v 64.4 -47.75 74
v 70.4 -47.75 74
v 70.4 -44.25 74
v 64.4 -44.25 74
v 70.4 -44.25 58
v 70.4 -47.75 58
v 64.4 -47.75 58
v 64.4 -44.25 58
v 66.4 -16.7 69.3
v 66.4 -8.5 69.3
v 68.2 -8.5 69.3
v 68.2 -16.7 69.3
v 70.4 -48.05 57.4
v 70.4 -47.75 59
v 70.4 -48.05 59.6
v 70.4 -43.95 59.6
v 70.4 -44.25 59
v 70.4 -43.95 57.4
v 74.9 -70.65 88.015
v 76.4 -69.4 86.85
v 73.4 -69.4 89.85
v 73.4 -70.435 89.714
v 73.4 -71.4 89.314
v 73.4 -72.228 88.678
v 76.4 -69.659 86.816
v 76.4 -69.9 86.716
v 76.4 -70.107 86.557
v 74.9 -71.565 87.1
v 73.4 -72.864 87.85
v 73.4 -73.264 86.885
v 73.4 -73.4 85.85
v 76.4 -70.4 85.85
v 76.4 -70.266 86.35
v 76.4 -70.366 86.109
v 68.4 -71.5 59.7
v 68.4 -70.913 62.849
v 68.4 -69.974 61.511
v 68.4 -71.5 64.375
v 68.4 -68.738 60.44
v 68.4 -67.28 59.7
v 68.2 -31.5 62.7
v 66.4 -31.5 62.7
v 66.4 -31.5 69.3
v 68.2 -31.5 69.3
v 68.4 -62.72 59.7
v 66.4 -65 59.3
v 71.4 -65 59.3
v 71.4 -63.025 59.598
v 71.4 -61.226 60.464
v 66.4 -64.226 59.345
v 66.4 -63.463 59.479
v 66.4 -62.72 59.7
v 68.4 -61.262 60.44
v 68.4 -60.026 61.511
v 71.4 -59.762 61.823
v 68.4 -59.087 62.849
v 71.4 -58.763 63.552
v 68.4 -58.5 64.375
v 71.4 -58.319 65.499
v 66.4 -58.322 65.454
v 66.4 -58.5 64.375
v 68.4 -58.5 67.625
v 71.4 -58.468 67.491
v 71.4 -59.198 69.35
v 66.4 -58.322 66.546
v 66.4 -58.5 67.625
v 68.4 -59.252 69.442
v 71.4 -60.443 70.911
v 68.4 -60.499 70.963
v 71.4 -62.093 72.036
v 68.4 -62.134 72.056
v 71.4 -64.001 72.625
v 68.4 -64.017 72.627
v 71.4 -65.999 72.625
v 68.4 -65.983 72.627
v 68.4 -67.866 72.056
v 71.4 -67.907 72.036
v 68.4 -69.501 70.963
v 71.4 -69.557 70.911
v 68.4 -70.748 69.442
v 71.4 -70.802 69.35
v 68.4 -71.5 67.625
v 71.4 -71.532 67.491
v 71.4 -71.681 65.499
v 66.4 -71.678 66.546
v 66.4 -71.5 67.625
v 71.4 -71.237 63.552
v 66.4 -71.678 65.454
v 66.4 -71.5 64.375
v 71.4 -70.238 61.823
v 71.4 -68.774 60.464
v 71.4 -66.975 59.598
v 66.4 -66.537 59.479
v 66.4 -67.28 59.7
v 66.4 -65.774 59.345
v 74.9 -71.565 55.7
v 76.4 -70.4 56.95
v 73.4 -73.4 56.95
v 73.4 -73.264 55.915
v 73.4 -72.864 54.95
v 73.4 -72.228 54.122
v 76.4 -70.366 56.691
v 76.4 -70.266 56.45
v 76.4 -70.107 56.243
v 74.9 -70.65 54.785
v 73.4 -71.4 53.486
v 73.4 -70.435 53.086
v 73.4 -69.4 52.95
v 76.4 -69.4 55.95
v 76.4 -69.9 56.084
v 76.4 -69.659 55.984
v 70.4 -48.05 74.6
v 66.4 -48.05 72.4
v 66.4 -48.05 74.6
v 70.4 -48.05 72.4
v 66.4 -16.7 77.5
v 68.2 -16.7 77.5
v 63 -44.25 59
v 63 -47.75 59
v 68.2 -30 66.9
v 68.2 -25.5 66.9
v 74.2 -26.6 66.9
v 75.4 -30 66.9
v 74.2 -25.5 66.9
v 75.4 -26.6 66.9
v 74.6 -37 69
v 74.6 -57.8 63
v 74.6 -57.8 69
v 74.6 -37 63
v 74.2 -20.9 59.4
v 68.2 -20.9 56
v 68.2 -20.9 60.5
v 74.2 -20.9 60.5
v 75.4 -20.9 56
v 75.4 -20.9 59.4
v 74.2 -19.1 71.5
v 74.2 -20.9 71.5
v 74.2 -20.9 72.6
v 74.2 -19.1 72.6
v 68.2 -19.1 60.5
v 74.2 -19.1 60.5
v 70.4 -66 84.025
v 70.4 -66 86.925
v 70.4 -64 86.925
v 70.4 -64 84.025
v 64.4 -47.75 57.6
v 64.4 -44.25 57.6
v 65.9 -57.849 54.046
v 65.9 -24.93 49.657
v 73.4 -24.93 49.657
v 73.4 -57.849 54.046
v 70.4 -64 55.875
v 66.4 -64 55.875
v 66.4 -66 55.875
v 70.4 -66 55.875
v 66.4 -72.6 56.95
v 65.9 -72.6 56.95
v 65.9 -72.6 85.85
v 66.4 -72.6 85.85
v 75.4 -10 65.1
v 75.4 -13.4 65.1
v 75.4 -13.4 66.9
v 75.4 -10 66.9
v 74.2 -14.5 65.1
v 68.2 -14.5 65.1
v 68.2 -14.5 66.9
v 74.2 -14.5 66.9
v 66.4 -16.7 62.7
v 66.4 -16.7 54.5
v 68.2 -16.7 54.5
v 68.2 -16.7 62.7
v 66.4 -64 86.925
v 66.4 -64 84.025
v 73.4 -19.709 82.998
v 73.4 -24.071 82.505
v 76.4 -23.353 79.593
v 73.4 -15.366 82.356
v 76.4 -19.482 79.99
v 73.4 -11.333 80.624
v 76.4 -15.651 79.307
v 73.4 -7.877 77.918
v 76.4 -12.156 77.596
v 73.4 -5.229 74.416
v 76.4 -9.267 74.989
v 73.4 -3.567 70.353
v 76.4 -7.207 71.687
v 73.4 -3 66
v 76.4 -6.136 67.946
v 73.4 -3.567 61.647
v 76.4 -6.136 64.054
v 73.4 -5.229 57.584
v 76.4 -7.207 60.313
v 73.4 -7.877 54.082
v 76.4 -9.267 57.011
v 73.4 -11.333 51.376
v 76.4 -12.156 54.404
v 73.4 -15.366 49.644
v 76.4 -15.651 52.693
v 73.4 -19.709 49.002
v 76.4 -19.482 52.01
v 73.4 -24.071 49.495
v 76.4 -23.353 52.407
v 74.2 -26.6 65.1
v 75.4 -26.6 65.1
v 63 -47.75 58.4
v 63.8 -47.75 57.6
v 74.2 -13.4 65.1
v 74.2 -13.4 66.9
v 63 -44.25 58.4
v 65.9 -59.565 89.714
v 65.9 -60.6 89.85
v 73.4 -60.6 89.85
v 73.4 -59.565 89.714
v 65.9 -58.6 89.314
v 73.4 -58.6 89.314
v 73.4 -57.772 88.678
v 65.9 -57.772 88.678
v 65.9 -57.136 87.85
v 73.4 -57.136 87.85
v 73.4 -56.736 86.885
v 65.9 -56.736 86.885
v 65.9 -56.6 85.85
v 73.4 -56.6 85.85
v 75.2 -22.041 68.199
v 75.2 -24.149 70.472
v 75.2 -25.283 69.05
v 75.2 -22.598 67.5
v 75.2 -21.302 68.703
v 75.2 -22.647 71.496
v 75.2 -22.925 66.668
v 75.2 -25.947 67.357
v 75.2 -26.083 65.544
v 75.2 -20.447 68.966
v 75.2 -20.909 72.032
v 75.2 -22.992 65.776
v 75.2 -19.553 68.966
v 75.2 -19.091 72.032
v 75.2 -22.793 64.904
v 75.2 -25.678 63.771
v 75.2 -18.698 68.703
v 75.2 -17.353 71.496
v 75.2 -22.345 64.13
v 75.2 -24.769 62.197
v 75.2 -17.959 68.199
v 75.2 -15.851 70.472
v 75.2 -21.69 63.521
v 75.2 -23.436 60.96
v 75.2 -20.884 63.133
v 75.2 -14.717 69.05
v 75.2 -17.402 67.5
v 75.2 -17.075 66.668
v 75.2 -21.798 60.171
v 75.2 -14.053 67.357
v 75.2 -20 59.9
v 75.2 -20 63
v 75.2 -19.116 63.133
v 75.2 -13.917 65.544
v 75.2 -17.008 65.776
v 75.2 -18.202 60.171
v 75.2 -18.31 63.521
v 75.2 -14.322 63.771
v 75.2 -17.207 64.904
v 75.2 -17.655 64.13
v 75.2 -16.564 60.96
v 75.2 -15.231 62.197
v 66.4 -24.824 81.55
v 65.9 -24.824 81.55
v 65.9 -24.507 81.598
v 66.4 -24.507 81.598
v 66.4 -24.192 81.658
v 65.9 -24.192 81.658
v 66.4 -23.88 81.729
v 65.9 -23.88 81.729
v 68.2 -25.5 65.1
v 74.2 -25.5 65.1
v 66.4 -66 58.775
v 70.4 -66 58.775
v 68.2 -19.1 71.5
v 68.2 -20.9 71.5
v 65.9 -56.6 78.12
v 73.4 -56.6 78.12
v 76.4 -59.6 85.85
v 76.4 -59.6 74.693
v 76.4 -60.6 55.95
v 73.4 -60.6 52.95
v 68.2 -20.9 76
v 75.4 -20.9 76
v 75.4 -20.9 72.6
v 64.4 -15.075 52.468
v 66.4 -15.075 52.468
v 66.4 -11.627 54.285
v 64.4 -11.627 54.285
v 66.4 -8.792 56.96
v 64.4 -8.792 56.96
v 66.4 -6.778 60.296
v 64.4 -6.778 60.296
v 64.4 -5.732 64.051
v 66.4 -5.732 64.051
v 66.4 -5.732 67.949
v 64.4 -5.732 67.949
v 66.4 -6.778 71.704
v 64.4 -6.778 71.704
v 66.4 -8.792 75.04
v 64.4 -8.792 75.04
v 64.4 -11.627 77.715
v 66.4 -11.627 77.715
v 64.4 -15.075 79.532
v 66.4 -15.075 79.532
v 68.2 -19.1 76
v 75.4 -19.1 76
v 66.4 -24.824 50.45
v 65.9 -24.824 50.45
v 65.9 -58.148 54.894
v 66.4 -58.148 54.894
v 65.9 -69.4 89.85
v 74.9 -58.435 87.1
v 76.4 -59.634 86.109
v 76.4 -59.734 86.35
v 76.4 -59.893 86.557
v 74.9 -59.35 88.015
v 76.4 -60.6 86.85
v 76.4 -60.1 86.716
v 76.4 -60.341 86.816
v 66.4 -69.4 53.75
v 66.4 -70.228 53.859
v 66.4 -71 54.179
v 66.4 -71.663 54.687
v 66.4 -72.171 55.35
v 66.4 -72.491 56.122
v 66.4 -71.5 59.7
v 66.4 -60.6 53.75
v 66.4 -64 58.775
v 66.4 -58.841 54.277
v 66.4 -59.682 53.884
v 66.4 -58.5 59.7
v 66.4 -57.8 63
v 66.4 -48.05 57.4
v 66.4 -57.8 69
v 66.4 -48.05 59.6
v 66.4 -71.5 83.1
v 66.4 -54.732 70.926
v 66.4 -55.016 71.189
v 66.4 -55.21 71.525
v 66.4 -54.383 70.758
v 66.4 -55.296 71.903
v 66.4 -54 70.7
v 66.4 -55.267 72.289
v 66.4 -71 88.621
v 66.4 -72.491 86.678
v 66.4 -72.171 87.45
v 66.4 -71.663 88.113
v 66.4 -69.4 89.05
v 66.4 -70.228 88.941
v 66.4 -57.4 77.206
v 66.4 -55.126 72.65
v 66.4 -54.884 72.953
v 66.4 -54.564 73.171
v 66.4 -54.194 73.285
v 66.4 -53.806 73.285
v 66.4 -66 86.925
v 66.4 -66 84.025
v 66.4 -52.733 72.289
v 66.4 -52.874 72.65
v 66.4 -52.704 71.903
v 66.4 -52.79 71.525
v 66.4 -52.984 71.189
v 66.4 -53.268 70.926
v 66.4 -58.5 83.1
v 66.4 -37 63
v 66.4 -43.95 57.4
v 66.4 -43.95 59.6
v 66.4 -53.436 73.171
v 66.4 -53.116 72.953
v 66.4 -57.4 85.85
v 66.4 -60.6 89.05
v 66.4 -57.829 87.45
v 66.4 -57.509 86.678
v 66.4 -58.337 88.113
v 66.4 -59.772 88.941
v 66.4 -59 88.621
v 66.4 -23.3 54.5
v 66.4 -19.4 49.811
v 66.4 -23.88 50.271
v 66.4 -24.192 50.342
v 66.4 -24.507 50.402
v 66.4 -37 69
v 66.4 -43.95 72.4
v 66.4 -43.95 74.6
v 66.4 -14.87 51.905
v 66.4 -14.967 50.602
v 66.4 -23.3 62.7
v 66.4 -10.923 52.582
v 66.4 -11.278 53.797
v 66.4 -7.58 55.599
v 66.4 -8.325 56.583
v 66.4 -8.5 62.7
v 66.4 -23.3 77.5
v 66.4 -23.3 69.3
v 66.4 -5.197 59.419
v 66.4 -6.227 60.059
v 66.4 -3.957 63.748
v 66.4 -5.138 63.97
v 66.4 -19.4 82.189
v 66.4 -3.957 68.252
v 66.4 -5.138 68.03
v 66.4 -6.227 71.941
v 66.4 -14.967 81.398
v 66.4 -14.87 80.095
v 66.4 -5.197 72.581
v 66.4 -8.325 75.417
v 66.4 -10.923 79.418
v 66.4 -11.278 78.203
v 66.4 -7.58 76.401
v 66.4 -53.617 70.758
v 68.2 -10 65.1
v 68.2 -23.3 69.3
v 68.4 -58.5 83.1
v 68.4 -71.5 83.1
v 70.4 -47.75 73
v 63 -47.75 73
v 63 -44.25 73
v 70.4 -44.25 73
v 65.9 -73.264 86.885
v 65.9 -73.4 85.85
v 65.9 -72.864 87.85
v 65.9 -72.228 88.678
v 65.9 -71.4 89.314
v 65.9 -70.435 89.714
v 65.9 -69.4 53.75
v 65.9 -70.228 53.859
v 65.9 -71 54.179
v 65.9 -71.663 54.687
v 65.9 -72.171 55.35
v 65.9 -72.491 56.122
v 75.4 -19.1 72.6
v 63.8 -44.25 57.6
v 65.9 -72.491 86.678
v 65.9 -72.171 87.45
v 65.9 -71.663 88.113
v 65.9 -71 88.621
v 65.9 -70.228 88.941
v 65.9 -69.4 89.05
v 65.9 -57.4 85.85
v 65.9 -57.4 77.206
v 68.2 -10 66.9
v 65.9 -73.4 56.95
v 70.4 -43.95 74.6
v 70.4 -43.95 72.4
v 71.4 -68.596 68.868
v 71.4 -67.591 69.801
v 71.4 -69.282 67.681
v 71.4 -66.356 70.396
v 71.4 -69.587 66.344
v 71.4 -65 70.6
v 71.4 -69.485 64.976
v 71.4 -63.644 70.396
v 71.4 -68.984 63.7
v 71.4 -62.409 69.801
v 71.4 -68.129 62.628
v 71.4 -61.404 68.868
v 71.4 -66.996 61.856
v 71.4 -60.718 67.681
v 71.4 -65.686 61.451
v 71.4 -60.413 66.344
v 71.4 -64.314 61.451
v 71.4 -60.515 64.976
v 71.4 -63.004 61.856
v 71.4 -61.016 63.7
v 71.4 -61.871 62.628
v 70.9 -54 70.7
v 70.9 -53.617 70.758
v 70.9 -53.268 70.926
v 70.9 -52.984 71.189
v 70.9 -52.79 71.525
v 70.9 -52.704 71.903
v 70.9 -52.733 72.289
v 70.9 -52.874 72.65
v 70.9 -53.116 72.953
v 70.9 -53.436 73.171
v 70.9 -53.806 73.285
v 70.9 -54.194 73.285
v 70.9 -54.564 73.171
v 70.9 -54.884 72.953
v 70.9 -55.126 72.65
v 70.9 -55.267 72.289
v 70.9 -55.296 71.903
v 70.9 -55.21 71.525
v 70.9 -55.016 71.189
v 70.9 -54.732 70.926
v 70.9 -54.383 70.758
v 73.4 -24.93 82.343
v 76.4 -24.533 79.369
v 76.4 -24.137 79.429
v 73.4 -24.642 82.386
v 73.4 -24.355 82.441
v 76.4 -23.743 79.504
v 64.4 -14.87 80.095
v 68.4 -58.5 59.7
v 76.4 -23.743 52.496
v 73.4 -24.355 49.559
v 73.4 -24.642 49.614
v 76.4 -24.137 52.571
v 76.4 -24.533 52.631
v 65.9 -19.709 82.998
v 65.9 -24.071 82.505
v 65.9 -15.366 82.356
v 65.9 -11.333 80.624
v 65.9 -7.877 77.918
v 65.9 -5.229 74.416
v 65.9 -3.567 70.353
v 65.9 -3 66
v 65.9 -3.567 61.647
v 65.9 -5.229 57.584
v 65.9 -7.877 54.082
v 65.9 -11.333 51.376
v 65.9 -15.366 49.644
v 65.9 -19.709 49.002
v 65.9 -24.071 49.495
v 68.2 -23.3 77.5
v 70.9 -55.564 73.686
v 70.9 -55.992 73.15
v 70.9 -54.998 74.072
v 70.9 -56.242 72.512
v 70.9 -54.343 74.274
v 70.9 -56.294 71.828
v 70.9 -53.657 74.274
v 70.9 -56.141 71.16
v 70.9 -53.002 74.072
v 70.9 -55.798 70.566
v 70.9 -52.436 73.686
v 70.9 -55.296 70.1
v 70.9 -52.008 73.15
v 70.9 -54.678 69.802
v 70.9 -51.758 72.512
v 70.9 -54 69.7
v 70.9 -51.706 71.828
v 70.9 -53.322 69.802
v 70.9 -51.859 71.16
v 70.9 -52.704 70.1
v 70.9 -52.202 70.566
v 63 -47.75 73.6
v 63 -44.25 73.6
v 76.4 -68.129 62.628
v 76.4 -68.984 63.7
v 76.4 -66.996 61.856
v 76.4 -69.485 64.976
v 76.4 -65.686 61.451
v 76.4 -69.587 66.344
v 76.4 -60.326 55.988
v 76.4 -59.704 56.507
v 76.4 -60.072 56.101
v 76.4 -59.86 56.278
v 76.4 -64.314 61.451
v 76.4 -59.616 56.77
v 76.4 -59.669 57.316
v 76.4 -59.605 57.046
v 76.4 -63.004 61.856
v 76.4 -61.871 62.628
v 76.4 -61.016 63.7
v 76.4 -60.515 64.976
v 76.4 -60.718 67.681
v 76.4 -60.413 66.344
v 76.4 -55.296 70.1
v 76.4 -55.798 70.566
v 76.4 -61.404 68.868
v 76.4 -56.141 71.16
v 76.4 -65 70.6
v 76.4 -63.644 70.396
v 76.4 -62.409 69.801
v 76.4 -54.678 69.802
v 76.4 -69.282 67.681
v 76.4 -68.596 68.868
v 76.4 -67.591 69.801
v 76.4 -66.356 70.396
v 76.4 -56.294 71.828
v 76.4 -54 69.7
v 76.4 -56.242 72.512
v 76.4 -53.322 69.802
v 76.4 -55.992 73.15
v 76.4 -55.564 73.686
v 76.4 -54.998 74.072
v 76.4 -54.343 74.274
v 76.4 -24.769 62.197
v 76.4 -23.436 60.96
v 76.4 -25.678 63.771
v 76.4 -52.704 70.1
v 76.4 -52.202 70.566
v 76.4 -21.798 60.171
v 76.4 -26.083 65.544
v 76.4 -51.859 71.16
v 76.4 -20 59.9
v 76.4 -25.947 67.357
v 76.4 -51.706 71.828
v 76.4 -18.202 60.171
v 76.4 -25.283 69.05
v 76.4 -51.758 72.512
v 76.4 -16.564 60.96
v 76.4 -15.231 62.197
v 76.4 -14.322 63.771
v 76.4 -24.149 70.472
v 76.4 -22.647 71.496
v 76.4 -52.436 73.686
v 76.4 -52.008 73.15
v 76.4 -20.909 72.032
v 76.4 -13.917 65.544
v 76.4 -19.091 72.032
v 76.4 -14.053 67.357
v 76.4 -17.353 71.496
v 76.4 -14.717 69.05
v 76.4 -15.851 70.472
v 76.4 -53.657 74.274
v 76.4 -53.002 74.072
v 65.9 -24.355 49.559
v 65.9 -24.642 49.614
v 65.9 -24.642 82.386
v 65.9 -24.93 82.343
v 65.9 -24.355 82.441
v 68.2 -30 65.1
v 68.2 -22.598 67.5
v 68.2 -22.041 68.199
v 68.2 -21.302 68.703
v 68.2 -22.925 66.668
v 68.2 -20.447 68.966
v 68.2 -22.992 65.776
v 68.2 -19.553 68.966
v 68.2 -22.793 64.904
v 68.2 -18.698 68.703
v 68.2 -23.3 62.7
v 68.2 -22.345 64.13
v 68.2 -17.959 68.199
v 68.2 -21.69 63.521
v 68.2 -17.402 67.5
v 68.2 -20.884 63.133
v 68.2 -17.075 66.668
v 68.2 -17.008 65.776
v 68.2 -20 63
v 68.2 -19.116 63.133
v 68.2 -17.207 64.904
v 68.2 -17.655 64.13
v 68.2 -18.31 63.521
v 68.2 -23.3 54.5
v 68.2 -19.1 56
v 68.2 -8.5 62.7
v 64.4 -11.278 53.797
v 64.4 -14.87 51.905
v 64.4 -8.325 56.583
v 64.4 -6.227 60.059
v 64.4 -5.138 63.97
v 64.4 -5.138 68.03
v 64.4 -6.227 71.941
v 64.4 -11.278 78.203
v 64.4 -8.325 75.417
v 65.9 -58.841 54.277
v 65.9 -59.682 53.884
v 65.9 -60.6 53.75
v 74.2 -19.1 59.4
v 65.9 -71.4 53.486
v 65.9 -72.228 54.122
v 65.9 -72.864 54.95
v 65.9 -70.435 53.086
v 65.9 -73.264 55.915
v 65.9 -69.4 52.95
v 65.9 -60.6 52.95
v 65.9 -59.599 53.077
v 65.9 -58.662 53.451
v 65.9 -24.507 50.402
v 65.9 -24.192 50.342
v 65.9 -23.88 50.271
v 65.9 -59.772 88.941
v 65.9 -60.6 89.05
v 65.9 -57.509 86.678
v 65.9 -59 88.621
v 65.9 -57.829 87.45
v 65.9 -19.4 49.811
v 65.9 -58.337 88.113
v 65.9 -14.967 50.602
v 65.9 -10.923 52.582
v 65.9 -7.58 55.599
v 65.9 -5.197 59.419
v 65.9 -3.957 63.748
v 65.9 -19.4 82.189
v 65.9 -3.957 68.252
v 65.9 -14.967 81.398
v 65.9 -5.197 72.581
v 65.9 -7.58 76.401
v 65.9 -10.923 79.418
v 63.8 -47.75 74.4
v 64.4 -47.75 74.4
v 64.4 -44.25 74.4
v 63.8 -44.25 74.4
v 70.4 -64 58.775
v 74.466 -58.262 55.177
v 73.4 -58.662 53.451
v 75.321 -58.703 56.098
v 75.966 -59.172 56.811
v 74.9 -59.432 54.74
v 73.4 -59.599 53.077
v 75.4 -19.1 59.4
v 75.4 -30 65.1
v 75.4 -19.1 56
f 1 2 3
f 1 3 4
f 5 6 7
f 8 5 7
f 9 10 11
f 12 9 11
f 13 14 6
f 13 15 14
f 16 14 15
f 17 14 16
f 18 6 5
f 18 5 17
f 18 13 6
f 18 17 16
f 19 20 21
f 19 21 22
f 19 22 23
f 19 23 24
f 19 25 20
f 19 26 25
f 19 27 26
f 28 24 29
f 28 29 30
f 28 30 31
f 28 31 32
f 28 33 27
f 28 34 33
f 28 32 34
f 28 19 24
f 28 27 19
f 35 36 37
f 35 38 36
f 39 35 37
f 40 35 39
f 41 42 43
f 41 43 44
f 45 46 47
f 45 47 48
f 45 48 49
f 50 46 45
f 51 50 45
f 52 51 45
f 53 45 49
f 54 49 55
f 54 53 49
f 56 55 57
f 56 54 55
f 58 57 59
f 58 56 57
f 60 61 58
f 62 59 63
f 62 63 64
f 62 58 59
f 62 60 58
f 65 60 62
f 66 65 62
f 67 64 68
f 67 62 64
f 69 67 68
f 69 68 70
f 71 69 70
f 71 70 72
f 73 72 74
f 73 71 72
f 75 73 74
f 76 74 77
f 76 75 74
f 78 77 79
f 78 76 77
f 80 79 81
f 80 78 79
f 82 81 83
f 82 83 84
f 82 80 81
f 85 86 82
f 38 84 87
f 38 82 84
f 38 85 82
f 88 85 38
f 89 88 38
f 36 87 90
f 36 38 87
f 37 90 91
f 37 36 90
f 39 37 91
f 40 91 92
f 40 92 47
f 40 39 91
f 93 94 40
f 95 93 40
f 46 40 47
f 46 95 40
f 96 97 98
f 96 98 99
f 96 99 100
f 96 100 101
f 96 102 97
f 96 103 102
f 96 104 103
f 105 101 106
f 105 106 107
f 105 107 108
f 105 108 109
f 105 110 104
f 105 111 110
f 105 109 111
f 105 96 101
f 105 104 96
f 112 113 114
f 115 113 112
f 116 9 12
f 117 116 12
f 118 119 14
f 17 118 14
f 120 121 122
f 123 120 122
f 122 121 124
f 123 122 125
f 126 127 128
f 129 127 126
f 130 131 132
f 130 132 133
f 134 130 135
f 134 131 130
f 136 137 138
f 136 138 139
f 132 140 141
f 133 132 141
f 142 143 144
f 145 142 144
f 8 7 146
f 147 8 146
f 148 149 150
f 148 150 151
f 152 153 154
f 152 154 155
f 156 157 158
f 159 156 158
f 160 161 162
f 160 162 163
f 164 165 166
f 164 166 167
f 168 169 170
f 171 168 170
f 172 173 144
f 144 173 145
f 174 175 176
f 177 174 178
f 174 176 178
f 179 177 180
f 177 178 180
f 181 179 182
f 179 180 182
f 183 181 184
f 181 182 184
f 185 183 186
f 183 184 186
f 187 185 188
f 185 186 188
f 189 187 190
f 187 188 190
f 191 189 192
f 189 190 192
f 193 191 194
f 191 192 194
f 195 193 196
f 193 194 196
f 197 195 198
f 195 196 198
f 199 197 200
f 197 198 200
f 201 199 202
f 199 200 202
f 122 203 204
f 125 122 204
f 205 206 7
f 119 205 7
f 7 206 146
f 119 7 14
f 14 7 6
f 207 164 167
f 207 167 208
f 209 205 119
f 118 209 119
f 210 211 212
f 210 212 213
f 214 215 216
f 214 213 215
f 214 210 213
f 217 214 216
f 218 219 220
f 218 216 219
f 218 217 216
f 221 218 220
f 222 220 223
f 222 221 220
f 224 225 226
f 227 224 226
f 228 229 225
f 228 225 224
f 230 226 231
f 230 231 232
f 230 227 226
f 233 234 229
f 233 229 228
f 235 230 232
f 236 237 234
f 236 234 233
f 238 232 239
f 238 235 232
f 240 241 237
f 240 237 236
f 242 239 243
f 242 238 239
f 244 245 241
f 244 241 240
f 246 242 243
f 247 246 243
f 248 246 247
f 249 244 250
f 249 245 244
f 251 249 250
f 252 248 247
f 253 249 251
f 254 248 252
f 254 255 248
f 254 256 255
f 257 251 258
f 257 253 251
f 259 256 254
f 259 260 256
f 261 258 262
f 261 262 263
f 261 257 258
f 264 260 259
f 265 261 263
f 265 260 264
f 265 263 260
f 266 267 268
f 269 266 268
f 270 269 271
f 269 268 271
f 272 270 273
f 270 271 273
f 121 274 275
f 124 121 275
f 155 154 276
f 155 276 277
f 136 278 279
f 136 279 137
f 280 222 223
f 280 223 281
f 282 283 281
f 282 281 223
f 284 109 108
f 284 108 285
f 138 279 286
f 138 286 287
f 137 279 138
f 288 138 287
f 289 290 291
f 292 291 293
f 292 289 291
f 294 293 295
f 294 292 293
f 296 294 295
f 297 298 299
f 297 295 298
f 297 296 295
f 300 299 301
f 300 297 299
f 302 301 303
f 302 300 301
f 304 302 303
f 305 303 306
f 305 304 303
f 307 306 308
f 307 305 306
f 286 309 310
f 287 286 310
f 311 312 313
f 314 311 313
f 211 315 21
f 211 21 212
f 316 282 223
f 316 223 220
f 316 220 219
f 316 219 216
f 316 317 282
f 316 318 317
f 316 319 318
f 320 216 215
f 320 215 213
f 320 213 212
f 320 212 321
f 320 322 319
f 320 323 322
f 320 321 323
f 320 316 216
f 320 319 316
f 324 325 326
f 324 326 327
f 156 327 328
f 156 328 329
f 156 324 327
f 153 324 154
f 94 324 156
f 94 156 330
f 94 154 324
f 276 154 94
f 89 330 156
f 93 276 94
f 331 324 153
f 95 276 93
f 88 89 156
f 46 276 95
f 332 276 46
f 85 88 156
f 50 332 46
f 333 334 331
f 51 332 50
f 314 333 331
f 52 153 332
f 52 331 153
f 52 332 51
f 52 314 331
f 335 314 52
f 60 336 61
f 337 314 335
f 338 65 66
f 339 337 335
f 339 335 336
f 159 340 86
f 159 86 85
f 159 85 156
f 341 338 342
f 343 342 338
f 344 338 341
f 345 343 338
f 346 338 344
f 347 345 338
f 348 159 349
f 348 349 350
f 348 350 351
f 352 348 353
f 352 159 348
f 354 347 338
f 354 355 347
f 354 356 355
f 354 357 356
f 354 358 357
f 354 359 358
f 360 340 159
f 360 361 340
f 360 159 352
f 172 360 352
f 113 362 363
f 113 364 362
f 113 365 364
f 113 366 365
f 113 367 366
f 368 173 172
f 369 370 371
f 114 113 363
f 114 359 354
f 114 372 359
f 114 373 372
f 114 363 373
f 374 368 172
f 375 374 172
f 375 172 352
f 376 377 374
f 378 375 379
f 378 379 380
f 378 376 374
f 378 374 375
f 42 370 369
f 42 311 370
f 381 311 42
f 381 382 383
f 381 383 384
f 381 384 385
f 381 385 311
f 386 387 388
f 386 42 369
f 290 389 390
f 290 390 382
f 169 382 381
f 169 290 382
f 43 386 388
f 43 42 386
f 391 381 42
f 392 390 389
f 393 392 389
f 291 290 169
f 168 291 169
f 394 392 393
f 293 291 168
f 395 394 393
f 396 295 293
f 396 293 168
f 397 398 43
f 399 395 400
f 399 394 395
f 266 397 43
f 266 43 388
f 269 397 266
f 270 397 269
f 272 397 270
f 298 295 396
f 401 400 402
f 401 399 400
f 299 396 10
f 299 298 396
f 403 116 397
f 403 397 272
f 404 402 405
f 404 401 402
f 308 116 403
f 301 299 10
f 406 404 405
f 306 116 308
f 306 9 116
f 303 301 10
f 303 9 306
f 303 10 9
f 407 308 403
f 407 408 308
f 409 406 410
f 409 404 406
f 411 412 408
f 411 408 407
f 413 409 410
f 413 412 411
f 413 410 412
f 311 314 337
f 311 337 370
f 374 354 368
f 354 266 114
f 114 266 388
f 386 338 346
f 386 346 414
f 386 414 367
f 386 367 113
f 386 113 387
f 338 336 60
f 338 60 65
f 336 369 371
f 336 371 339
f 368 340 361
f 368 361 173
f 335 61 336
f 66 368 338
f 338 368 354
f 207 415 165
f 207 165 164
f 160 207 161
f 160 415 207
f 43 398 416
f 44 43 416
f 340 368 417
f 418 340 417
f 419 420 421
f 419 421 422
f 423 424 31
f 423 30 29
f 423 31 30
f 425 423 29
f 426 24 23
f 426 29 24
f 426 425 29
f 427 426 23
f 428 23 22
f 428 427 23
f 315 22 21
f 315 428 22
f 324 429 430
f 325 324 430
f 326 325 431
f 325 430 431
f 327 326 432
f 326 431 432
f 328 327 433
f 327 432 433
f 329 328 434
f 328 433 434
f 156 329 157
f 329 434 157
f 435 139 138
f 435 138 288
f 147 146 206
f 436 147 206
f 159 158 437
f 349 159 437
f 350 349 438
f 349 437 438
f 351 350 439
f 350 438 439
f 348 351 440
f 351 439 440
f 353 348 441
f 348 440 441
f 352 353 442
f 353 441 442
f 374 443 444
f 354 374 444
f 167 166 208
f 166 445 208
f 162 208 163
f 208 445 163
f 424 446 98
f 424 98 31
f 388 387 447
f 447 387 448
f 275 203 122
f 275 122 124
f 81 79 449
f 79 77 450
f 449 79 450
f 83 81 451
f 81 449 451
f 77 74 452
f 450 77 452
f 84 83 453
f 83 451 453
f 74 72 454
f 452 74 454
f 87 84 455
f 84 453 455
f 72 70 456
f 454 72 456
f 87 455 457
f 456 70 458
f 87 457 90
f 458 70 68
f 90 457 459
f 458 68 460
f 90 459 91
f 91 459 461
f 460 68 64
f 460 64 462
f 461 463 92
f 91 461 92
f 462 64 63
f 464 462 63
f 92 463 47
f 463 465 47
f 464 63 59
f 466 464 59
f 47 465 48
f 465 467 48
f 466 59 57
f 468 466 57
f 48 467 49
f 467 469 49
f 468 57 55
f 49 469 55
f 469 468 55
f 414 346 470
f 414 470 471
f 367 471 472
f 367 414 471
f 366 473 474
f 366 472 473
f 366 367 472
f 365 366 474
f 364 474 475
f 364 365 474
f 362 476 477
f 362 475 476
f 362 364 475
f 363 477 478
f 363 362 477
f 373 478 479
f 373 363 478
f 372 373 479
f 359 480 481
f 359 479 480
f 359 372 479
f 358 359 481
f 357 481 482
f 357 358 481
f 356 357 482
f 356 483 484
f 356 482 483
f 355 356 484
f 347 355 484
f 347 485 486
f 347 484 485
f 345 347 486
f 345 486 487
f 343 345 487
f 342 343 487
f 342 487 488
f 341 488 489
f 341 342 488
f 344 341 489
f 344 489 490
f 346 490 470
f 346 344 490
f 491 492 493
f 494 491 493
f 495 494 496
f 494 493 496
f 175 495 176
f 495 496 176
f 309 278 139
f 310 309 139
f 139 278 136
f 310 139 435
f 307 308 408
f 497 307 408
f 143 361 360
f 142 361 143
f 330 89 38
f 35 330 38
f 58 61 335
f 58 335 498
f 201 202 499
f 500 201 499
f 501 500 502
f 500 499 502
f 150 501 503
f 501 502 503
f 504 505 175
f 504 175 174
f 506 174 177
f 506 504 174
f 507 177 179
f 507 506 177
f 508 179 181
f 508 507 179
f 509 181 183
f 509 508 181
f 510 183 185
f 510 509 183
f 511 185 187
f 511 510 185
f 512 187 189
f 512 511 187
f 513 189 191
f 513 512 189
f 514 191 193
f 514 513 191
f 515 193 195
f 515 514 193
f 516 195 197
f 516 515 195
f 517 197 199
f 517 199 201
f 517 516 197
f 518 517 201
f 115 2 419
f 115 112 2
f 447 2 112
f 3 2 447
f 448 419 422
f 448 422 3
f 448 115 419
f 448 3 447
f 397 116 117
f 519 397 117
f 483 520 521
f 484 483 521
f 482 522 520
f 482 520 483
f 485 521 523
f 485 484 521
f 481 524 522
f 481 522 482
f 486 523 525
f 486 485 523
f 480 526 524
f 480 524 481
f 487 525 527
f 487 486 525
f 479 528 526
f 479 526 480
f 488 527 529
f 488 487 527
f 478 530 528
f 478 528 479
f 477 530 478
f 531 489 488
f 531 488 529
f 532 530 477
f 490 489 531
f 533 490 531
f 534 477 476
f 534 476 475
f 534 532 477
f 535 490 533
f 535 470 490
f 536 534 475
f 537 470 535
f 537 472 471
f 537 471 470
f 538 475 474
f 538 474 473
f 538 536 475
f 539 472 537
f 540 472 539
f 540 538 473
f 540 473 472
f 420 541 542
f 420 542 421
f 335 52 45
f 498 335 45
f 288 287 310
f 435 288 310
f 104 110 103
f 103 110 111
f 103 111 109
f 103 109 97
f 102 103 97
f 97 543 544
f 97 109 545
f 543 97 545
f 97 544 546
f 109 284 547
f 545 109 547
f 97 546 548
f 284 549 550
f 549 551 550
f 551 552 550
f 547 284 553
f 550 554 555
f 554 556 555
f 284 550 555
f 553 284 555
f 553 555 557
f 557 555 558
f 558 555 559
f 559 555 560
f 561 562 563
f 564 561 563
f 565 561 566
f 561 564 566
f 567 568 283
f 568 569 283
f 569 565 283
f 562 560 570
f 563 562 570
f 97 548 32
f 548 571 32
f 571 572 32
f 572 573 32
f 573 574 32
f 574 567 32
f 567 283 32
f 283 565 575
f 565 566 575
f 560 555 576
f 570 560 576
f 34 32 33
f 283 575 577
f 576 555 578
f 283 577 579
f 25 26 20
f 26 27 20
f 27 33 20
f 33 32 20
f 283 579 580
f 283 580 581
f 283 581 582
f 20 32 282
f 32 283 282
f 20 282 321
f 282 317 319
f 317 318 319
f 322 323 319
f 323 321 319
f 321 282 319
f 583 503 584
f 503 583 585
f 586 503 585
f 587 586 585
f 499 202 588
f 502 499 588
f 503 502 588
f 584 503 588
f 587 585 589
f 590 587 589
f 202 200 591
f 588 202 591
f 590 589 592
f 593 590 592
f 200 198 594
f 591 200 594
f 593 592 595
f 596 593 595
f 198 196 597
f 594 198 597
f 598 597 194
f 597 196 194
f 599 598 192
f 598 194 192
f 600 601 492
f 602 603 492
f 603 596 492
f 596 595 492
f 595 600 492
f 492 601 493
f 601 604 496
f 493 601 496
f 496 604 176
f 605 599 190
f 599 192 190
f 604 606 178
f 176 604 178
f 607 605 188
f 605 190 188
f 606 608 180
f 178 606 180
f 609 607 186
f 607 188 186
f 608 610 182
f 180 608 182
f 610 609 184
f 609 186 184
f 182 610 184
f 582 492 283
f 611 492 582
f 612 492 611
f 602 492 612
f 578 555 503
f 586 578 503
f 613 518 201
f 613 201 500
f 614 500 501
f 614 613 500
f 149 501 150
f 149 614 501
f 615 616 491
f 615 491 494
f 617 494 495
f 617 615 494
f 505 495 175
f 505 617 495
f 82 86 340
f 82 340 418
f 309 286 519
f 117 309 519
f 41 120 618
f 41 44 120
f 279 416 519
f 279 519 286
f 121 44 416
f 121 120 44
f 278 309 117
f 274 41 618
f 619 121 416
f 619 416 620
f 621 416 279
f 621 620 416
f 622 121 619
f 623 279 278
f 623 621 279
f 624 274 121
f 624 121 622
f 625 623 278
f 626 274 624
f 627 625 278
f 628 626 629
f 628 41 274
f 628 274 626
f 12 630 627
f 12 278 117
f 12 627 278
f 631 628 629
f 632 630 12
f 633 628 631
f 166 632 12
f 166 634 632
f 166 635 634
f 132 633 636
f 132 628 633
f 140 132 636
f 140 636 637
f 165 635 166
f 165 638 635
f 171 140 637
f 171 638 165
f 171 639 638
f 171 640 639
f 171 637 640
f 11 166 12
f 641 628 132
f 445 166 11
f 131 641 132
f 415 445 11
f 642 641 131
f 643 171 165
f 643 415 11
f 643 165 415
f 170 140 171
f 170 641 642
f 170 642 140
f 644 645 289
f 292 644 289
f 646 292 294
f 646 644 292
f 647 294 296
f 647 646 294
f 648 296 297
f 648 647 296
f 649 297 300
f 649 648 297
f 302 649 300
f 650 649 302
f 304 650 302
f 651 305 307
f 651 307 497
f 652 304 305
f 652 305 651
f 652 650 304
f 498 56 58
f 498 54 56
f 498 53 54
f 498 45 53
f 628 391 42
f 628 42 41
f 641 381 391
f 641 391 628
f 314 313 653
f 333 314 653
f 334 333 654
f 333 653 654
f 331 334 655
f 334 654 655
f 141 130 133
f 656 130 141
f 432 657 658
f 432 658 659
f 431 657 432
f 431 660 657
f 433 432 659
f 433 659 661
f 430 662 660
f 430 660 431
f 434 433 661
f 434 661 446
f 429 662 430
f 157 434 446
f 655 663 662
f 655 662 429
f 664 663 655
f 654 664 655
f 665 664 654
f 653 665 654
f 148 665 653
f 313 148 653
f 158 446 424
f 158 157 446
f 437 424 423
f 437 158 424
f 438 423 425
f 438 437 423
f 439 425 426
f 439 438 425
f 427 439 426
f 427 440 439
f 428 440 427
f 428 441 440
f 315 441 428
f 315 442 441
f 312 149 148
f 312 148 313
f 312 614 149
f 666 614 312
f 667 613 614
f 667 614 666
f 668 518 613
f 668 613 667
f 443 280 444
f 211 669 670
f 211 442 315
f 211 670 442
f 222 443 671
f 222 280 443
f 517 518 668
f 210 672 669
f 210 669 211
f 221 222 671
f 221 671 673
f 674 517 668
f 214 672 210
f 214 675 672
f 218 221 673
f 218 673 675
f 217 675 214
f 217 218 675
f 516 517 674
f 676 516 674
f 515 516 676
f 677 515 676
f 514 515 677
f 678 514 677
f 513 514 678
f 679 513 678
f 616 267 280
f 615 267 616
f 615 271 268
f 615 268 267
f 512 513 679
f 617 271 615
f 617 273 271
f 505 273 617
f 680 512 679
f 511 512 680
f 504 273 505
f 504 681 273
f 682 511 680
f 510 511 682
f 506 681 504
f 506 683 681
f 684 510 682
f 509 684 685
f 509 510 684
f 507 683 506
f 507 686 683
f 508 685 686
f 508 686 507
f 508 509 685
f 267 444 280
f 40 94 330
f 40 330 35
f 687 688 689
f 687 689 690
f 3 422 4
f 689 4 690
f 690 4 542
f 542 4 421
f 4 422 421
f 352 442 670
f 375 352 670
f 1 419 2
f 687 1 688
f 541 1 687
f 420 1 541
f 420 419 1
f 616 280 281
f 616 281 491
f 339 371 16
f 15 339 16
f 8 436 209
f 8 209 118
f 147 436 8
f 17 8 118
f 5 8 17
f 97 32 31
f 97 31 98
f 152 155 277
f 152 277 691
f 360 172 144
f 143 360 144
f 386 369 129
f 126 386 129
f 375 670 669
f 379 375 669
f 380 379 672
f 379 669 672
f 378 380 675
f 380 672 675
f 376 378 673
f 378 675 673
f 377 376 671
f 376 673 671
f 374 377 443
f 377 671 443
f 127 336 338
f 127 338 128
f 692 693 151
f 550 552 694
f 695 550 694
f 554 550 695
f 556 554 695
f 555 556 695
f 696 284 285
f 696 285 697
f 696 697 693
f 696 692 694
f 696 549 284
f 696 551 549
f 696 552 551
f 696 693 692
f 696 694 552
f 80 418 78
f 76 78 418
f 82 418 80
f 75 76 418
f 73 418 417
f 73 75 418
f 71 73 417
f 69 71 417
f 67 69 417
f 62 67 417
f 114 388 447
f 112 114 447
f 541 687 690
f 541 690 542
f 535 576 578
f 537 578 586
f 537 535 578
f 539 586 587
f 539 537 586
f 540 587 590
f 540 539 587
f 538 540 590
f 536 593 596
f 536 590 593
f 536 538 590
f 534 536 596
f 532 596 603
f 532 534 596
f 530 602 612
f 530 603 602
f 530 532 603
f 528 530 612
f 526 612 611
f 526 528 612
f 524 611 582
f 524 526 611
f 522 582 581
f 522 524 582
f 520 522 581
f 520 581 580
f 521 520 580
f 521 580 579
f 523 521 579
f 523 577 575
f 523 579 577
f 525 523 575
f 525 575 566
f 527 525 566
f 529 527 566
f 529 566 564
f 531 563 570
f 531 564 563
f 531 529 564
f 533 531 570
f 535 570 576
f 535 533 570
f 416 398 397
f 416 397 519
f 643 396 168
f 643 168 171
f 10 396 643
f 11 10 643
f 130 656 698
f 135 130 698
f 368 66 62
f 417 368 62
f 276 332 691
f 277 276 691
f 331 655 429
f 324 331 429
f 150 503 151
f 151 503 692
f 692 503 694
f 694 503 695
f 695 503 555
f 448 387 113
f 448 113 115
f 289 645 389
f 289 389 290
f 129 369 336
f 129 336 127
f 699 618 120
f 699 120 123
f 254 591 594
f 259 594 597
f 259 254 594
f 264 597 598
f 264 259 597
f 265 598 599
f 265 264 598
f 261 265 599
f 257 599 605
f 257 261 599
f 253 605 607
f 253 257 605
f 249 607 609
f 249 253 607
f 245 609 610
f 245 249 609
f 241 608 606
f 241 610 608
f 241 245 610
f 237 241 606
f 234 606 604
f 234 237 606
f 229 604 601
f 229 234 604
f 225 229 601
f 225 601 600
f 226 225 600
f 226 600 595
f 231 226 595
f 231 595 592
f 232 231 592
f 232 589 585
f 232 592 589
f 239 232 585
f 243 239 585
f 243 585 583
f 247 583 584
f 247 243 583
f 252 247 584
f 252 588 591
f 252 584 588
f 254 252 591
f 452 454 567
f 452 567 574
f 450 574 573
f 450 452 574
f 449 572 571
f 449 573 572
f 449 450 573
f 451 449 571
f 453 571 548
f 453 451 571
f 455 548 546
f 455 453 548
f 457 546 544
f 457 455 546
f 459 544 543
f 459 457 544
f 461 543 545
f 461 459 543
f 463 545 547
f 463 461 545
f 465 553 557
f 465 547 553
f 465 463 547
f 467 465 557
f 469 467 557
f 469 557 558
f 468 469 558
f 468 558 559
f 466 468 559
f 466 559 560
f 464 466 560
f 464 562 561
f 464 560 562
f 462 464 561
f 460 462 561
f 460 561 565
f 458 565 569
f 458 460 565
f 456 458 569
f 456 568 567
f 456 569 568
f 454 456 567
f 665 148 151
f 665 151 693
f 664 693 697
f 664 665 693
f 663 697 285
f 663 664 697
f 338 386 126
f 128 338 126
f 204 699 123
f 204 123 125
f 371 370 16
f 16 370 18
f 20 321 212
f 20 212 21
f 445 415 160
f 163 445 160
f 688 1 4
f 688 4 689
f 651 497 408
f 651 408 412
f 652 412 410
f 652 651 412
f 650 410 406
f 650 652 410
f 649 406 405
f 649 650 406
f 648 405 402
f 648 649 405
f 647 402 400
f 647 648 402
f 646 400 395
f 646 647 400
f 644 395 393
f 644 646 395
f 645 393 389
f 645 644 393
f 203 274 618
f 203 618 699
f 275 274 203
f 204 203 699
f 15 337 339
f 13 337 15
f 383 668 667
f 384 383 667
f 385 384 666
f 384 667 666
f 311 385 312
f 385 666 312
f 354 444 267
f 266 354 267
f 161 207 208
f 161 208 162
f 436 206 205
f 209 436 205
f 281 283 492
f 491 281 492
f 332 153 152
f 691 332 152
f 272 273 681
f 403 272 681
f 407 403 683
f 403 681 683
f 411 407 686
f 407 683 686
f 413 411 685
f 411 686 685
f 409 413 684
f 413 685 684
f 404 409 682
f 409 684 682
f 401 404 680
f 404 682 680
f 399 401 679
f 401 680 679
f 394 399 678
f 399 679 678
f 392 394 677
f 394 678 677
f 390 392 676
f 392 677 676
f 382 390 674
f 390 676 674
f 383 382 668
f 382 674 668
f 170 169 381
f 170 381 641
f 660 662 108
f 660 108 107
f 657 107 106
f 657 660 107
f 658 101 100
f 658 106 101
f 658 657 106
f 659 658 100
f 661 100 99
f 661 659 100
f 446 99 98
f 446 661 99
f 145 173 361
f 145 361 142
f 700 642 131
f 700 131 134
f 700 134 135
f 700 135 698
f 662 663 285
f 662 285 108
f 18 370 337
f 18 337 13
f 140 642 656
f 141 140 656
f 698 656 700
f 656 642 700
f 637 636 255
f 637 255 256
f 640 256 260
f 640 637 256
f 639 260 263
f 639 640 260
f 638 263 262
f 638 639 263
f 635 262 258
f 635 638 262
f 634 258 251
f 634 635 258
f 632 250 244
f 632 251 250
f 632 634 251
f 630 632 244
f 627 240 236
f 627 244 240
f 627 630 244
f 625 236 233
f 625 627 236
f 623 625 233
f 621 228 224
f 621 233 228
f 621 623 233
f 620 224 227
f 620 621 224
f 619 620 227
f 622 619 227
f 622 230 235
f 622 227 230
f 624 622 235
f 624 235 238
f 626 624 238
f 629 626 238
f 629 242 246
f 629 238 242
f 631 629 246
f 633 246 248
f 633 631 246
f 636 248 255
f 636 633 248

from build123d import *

# Parameters (mm, degrees)
BOSS_EXTRUDE1_START  = 65.9
BOSS_EXTRUDE1_DEPTH  = 10.5
BOSS_EXTRUDE2_START  = 65.8
BOSS_EXTRUDE2_DEPTH  = 0.6
CHAMFER1_SIZE        = 3
CHAMFER2_SIZE        = 3
BOSS_EXTRUDE3_START  = 62.7
SKETCH3_W            = 2.3
SKETCH3_H            = 23
BOSS_EXTRUDE3_DEPTH  = 6.6
BOSS_EXTRUDE4_START  = 54.5
SKETCH4_W            = 2.3
SKETCH4_H            = 6.6
BOSS_EXTRUDE4_DEPTH  = 23
BOSS_EXTRUDE5_START  = 65.9
SKETCH5_R            = 4.6
BOSS_EXTRUDE5_DEPTH  = 2.3
BOSS_EXTRUDE6_START  = 75.2
SKETCH6_R            = 6.1
BOSS_EXTRUDE6_DEPTH  = 1.7
BOSS_EXTRUDE7_START  = 68.1
SKETCH7_R            = 3
BOSS_EXTRUDE7_DEPTH  = 7.2
BOSS_EXTRUDE8_START  = 65.1
SKETCH8_W            = 6.1
SKETCH8_H            = 1.1
BOSS_EXTRUDE8_DEPTH  = 1.8
BOSS_EXTRUDE9_START  = 71.5
SKETCH9_W            = 6.1
SKETCH9_H            = 1.8
BOSS_EXTRUDE9_DEPTH  = 1.1
BOSS_EXTRUDE10_START = 65.1
SKETCH10_W           = 6.1
SKETCH10_H           = 1.1
BOSS_EXTRUDE10_DEPTH = 1.8
BOSS_EXTRUDE11_START = 59.4
SKETCH11_W           = 6.1
SKETCH11_H           = 1.8
BOSS_EXTRUDE11_DEPTH = 1.1
BOSS_EXTRUDE12_START = 65.1
SKETCH12_W           = 7.3
SKETCH12_H           = 3.4
BOSS_EXTRUDE12_DEPTH = 1.8
BOSS_EXTRUDE13_START = 72.6
SKETCH13_W           = 7.3
SKETCH13_H           = 1.8
BOSS_EXTRUDE13_DEPTH = 3.4
BOSS_EXTRUDE14_START = 65.1
SKETCH14_W           = 7.3
SKETCH14_H           = 3.4
BOSS_EXTRUDE14_DEPTH = 1.8
BOSS_EXTRUDE15_START = 56
SKETCH15_W           = 7.3
SKETCH15_H           = 1.8
BOSS_EXTRUDE15_DEPTH = 3.4
BOSS_EXTRUDE16_START = 64.4
BOSS_EXTRUDE16_DEPTH = 2.05
BOSS_EXTRUDE17_START = 55.875
SKETCH17_W           = 4.1
SKETCH17_H           = 2
BOSS_EXTRUDE17_DEPTH = 2.9
BOSS_EXTRUDE18_START = 84.025
SKETCH18_W           = 4.1
SKETCH18_H           = 2
BOSS_EXTRUDE18_DEPTH = 2.9
BOSS_EXTRUDE19_START = 59.7
SKETCH19_W           = 2.1
SKETCH19_H           = 13
BOSS_EXTRUDE19_DEPTH = 23.4
BOSS_EXTRUDE20_START = 66.3
SKETCH20_R           = 6.7
BOSS_EXTRUDE20_DEPTH = 5.1
BOSS_EXTRUDE21_START = 71.1
SKETCH21_R           = 4.6
BOSS_EXTRUDE21_DEPTH = 5.8
BOSS_EXTRUDE22_START = 63
SKETCH22_W           = 8.3
SKETCH22_H           = 20.8
BOSS_EXTRUDE22_DEPTH = 6
BOSS_EXTRUDE23_START = 70.9
SKETCH23_R           = 2.3
BOSS_EXTRUDE23_DEPTH = 6
BOSS_EXTRUDE24_START = 66.3
SKETCH24_R           = 1.3
BOSS_EXTRUDE24_DEPTH = 4.65
BOSS_EXTRUDE25_START = 57.4
SKETCH25_W           = 4.1
SKETCH25_H           = 4.1
BOSS_EXTRUDE25_DEPTH = 2.2
BOSS_EXTRUDE26_START = -47.75
BOSS_EXTRUDE26_DEPTH = 3.5
BOSS_EXTRUDE27_START = 72.4
SKETCH27_W           = 4.1
SKETCH27_H           = 4.1
BOSS_EXTRUDE27_DEPTH = 2.2
BOSS_EXTRUDE28_START = -47.75
BOSS_EXTRUDE28_DEPTH = 3.5


with BuildPart() as part:
    # Sketch1 → Boss-Extrude1 (new body)
    with BuildSketch(Plane(origin=(0, 0, 0), x_dir=(0, 0, -1), z_dir=(1, 0, 0)).offset(BOSS_EXTRUDE1_START)):
        with BuildLine():
            Line((-49.657293521, -24.929701405), (-54.04649339, -57.848700423))
            ThreePointArc((-54.04649339, -57.848700423), (-53.234221048, -59.119126346), (-52.95, -60.6))
            Line((-52.95, -60.6), (-52.95, -69.4))
            ThreePointArc((-52.95, -69.4), (-54.121572875, -72.228427125), (-56.95, -73.4))
            Line((-56.95, -73.4), (-85.85, -73.4))
            ThreePointArc((-85.85, -73.4), (-88.678427125, -72.228427125), (-89.85, -69.4))
            Line((-89.85, -69.4), (-89.85, -60.6))
            ThreePointArc((-89.85, -60.6), (-88.678427125, -57.771572875), (-85.85, -56.6))
            Line((-85.85, -56.6), (-78.12, -56.6))
            Line((-78.12, -56.6), (-82.342706479, -24.929701405))
            ThreePointArc((-82.342706479, -24.929701405), (-82.412282932, -24.49821266), (-82.505320186, -24.071167593))
            ThreePointArc((-82.505320186, -24.071167593), (-66, -3), (-49.494679814, -24.071167593))
            ThreePointArc((-49.494679814, -24.071167593), (-49.587717068, -24.49821266), (-49.657293521, -24.929701405))
        make_face()
    extrude(amount=BOSS_EXTRUDE1_DEPTH)


with BuildPart() as body_2:
    # Sketch2 → Boss-Extrude2 (new body)
    with BuildSketch(Plane(origin=(0, 0, 0), x_dir=(0, 0, -1), z_dir=(1, 0, 0)).offset(BOSS_EXTRUDE2_START)):
        with BuildLine():
            Line((-50.450275841, -24.823970429), (-54.893518409, -58.148289686))
            ThreePointArc((-54.893518409, -58.148289686), (-54.049936113, -59.247362039), (-53.75, -60.6))
            Line((-53.75, -60.6), (-53.75, -69.4))
            ThreePointArc((-53.75, -69.4), (-54.6872583, -71.6627417), (-56.95, -72.6))
            Line((-56.95, -72.6), (-85.85, -72.6))
            ThreePointArc((-85.85, -72.6), (-88.1127417, -71.6627417), (-89.05, -69.4))
            Line((-89.05, -69.4), (-89.05, -60.6))
            ThreePointArc((-89.05, -60.6), (-88.1127417, -58.3372583), (-85.85, -57.4))
            Line((-85.85, -57.4), (-77.206253549, -57.4))
            Line((-77.206253549, -57.4), (-81.549724159, -24.823970429))
            ThreePointArc((-81.549724159, -24.823970429), (-81.626258257, -24.34933281), (-81.728599236, -23.879583236))
            ThreePointArc((-81.728599236, -23.879583236), (-66, -3.8), (-50.271400764, -23.879583236))
            ThreePointArc((-50.271400764, -23.879583236), (-50.373741743, -24.34933281), (-50.450275841, -24.823970429))
        make_face()
    extrude(amount=BOSS_EXTRUDE2_DEPTH)


with BuildPart() as part_1:
    add(part.part)

    # Combine1: cut body 2
    add(body_2.part, mode=Mode.SUBTRACT)

    # Chamfer1
    chamfer1_edges = [part_1.edges().sort_by_distance(p)[0] for p in [
        (76.4, -41.389200914, 51.851893455),
        (76.4, -24.49821266, 49.587717068),
        (76.4, -24.49821266, 82.412282932),
        (76.4, -3, 66),
        (76.4, -40.764850703, 80.23135324),
    ]]
    chamfer(chamfer1_edges, length=CHAMFER1_SIZE)

    # Chamfer2
    chamfer2_edges = [part_1.edges().sort_by_distance(p)[0] for p in [
        (76.4, -56.6, 80.471725405),
        (76.4, -57.771572875, 88.678427125),
        (76.4, -57.786965833, 54.106263237),
        (76.4, -65, 89.85),
        (76.4, -65, 52.95),
        (76.4, -72.228427125, 88.678427125),
        (76.4, -72.228427125, 54.121572875),
        (76.4, -73.4, 71.4),
    ]]
    chamfer(chamfer2_edges, length=CHAMFER2_SIZE)


with BuildPart() as body_2_2:
    # Sketch3 → Boss-Extrude3 (new body)
    with BuildSketch(Plane.XY.offset(BOSS_EXTRUDE3_START)):
        with Locations((67.05, -20)):
            Rectangle(SKETCH3_W, SKETCH3_H)
    extrude(amount=BOSS_EXTRUDE3_DEPTH)


with BuildPart() as part_2:
    add(part_1.part)

    # Combine2: cut body 2 2
    add(body_2_2.part, mode=Mode.SUBTRACT)


with BuildPart() as body_2_3:
    # Sketch4 → Boss-Extrude4 (new body)
    with BuildSketch(Plane.XY.offset(BOSS_EXTRUDE4_START)):
        with Locations((67.05, -20)):
            Rectangle(SKETCH4_W, SKETCH4_H)
    extrude(amount=BOSS_EXTRUDE4_DEPTH)


with BuildPart() as part_3:
    add(part_2.part)

    # Combine3: cut body 2 3
    add(body_2_3.part, mode=Mode.SUBTRACT)


with BuildPart() as body_2_4:
    # Sketch5 → Boss-Extrude5 (new body)
    with BuildSketch(Plane(origin=(0, 0, 0), x_dir=(0, 0, -1), z_dir=(1, 0, 0)).offset(BOSS_EXTRUDE5_START)):
        with Locations((-66, -20)):
            Circle(SKETCH5_R)
    extrude(amount=BOSS_EXTRUDE5_DEPTH)


with BuildPart() as part_4:
    add(part_3.part)

    # Combine4: cut body 2 4
    add(body_2_4.part, mode=Mode.SUBTRACT)


with BuildPart() as body_2_5:
    # Sketch6 → Boss-Extrude6 (new body)
    with BuildSketch(Plane(origin=(0, 0, 0), x_dir=(0, 0, -1), z_dir=(1, 0, 0)).offset(BOSS_EXTRUDE6_START)):
        with Locations((-66, -20)):
            Circle(SKETCH6_R)
    extrude(amount=BOSS_EXTRUDE6_DEPTH)


with BuildPart() as part_5:
    add(part_4.part)

    # Combine5: cut body 2 5
    add(body_2_5.part, mode=Mode.SUBTRACT)


with BuildPart() as body_2_6:
    # Sketch7 → Boss-Extrude7 (new body)
    with BuildSketch(Plane(origin=(0, 0, 0), x_dir=(0, 0, -1), z_dir=(1, 0, 0)).offset(BOSS_EXTRUDE7_START)):
        with Locations((-66, -20)):
            Circle(SKETCH7_R)
    extrude(amount=BOSS_EXTRUDE7_DEPTH)


with BuildPart() as part_6:
    add(part_5.part)

    # Combine6: cut body 2 6
    add(body_2_6.part, mode=Mode.SUBTRACT)


with BuildPart() as body_2_7:
    # Sketch8 → Boss-Extrude8 (new body)
    with BuildSketch(Plane.XY.offset(BOSS_EXTRUDE8_START)):
        with Locations((71.15, -13.95)):
            Rectangle(SKETCH8_W, SKETCH8_H)
    extrude(amount=BOSS_EXTRUDE8_DEPTH)


with BuildPart() as part_7:
    add(part_6.part)

    # Combine7: cut body 2 7
    add(body_2_7.part, mode=Mode.SUBTRACT)


with BuildPart() as body_2_8:
    # Sketch9 → Boss-Extrude9 (new body)
    with BuildSketch(Plane.XY.offset(BOSS_EXTRUDE9_START)):
        with Locations((71.15, -20)):
            Rectangle(SKETCH9_W, SKETCH9_H)
    extrude(amount=BOSS_EXTRUDE9_DEPTH)


with BuildPart() as part_8:
    add(part_7.part)

    # Combine8: cut body 2 8
    add(body_2_8.part, mode=Mode.SUBTRACT)


with BuildPart() as body_2_9:
    # Sketch10 → Boss-Extrude10 (new body)
    with BuildSketch(Plane.XY.offset(BOSS_EXTRUDE10_START)):
        with Locations((71.15, -26.05)):
            Rectangle(SKETCH10_W, SKETCH10_H)
    extrude(amount=BOSS_EXTRUDE10_DEPTH)


with BuildPart() as part_9:
    add(part_8.part)

    # Combine9: cut body 2 9
    add(body_2_9.part, mode=Mode.SUBTRACT)


with BuildPart() as body_2_10:
    # Sketch11 → Boss-Extrude11 (new body)
    with BuildSketch(Plane.XY.offset(BOSS_EXTRUDE11_START)):
        with Locations((71.15, -20)):
            Rectangle(SKETCH11_W, SKETCH11_H)
    extrude(amount=BOSS_EXTRUDE11_DEPTH)


with BuildPart() as part_10:
    add(part_9.part)

    # Combine10: cut body 2 10
    add(body_2_10.part, mode=Mode.SUBTRACT)


with BuildPart() as body_2_11:
    # Sketch12 → Boss-Extrude12 (new body)
    with BuildSketch(Plane.XY.offset(BOSS_EXTRUDE12_START)):
        with Locations((71.75, -11.7)):
            Rectangle(SKETCH12_W, SKETCH12_H)
    extrude(amount=BOSS_EXTRUDE12_DEPTH)


with BuildPart() as part_11:
    add(part_10.part)

    # Combine11: cut body 2 11
    add(body_2_11.part, mode=Mode.SUBTRACT)


with BuildPart() as body_2_12:
    # Sketch13 → Boss-Extrude13 (new body)
    with BuildSketch(Plane.XY.offset(BOSS_EXTRUDE13_START)):
        with Locations((71.75, -20)):
            Rectangle(SKETCH13_W, SKETCH13_H)
    extrude(amount=BOSS_EXTRUDE13_DEPTH)


with BuildPart() as part_12:
    add(part_11.part)

    # Combine12: cut body 2 12
    add(body_2_12.part, mode=Mode.SUBTRACT)


with BuildPart() as body_2_13:
    # Sketch14 → Boss-Extrude14 (new body)
    with BuildSketch(Plane.XY.offset(BOSS_EXTRUDE14_START)):
        with Locations((71.75, -28.3)):
            Rectangle(SKETCH14_W, SKETCH14_H)
    extrude(amount=BOSS_EXTRUDE14_DEPTH)


with BuildPart() as part_13:
    add(part_12.part)

    # Combine13: cut body 2 13
    add(body_2_13.part, mode=Mode.SUBTRACT)


with BuildPart() as body_2_14:
    # Sketch15 → Boss-Extrude15 (new body)
    with BuildSketch(Plane.XY.offset(BOSS_EXTRUDE15_START)):
        with Locations((71.75, -20)):
            Rectangle(SKETCH15_W, SKETCH15_H)
    extrude(amount=BOSS_EXTRUDE15_DEPTH)


with BuildPart() as part_14:
    add(part_13.part)

    # Combine14: cut body 2 14
    add(body_2_14.part, mode=Mode.SUBTRACT)

    # Sketch16 → Boss-Extrude16 (add)
    with BuildSketch(Plane(origin=(0, 0, 0), x_dir=(0, 0, -1), z_dir=(1, 0, 0)).offset(BOSS_EXTRUDE16_START)):
        with BuildLine():
            Line((-51.904610688, -14.86969785), (-52.468426261, -15.074909936))
            ThreePointArc((-52.468426261, -15.074909936), (-66, -5.6), (-79.531573739, -15.074909936))
            Line((-79.531573739, -15.074909936), (-80.095389312, -14.86969785))
            ThreePointArc((-80.095389312, -14.86969785), (-66, -5), (-51.904610688, -14.86969785))
        make_face()
    extrude(amount=BOSS_EXTRUDE16_DEPTH)


with BuildPart() as body_2_15:
    # Sketch17 → Boss-Extrude17 (new body)
    with BuildSketch(Plane.XY.offset(BOSS_EXTRUDE17_START)):
        with Locations((68.35, -65)):
            Rectangle(SKETCH17_W, SKETCH17_H)
    extrude(amount=BOSS_EXTRUDE17_DEPTH)


with BuildPart() as part_15:
    add(part_14.part)

    # Combine15: cut body 2 15
    add(body_2_15.part, mode=Mode.SUBTRACT)


with BuildPart() as body_2_16:
    # Sketch18 → Boss-Extrude18 (new body)
    with BuildSketch(Plane.XY.offset(BOSS_EXTRUDE18_START)):
        with Locations((68.35, -65)):
            Rectangle(SKETCH18_W, SKETCH18_H)
    extrude(amount=BOSS_EXTRUDE18_DEPTH)


with BuildPart() as part_16:
    add(part_15.part)

    # Combine16: cut body 2 16
    add(body_2_16.part, mode=Mode.SUBTRACT)


with BuildPart() as body_2_17:
    # Sketch19 → Boss-Extrude19 (new body)
    with BuildSketch(Plane.XY.offset(BOSS_EXTRUDE19_START)):
        with Locations((67.35, -65)):
            Rectangle(SKETCH19_W, SKETCH19_H)
    extrude(amount=BOSS_EXTRUDE19_DEPTH)


with BuildPart() as part_17:
    add(part_16.part)

    # Combine17: cut body 2 17
    add(body_2_17.part, mode=Mode.SUBTRACT)


with BuildPart() as body_2_18:
    # Sketch20 → Boss-Extrude20 (new body)
    with BuildSketch(Plane(origin=(0, 0, 0), x_dir=(0, 0, -1), z_dir=(1, 0, 0)).offset(BOSS_EXTRUDE20_START)):
        with Locations((-66, -65)):
            Circle(SKETCH20_R)
    extrude(amount=BOSS_EXTRUDE20_DEPTH)


with BuildPart() as part_18:
    add(part_17.part)

    # Combine18: cut body 2 18
    add(body_2_18.part, mode=Mode.SUBTRACT)


with BuildPart() as body_2_19:
    # Sketch21 → Boss-Extrude21 (new body)
    with BuildSketch(Plane(origin=(0, 0, 0), x_dir=(0, 0, -1), z_dir=(1, 0, 0)).offset(BOSS_EXTRUDE21_START)):
        with Locations(Location((-66, -65, 0), (0, 0, 180))):
            Circle(SKETCH21_R)
    extrude(amount=BOSS_EXTRUDE21_DEPTH)


with BuildPart() as part_19:
    add(part_18.part)

    # Combine19: cut body 2 19
    add(body_2_19.part, mode=Mode.SUBTRACT)


with BuildPart() as body_2_20:
    # Sketch22 → Boss-Extrude22 (new body)
    with BuildSketch(Plane.XY.offset(BOSS_EXTRUDE22_START)):
        with Locations((70.45, -47.4)):
            Rectangle(SKETCH22_W, SKETCH22_H)
    extrude(amount=BOSS_EXTRUDE22_DEPTH)


with BuildPart() as part_20:
    add(part_19.part)

    # Combine20: cut body 2 20
    add(body_2_20.part, mode=Mode.SUBTRACT)


with BuildPart() as body_2_21:
    # Sketch23 → Boss-Extrude23 (new body)
    with BuildSketch(Plane(origin=(0, 0, 0), x_dir=(0, 0, -1), z_dir=(1, 0, 0)).offset(BOSS_EXTRUDE23_START)):
        with Locations((-72, -54)):
            Circle(SKETCH23_R)
    extrude(amount=BOSS_EXTRUDE23_DEPTH)


with BuildPart() as part_21:
    add(part_20.part)

    # Combine21: cut body 2 21
    add(body_2_21.part, mode=Mode.SUBTRACT)


with BuildPart() as body_2_22:
    # Sketch24 → Boss-Extrude24 (new body)
    with BuildSketch(Plane(origin=(0, 0, 0), x_dir=(0, 0, -1), z_dir=(1, 0, 0)).offset(BOSS_EXTRUDE24_START)):
        with Locations((-72, -54)):
            Circle(SKETCH24_R)
    extrude(amount=BOSS_EXTRUDE24_DEPTH)


with BuildPart() as part_22:
    add(part_21.part)

    # Combine22: cut body 2 22
    add(body_2_22.part, mode=Mode.SUBTRACT)


with BuildPart() as body_2_23:
    # Sketch25 → Boss-Extrude25 (new body)
    with BuildSketch(Plane.XY.offset(BOSS_EXTRUDE25_START)):
        with Locations((68.35, -46)):
            Rectangle(SKETCH25_W, SKETCH25_H)
    extrude(amount=BOSS_EXTRUDE25_DEPTH)


with BuildPart() as part_23:
    add(part_22.part)

    # Combine23: cut body 2 23
    add(body_2_23.part, mode=Mode.SUBTRACT)

    # Sketch26 → Boss-Extrude26 (add)
    with BuildSketch(Plane(origin=(0, 0, 0), x_dir=(1, 0, 0), z_dir=(0, 1, 0)).offset(BOSS_EXTRUDE26_START)):
        Polygon((70.6, -59), (70.6, -58), (64.4, -58), (64.4, -57.6), (63.8, -57.6), (63, -58.4), (63, -59), align=None)
    extrude(amount=BOSS_EXTRUDE26_DEPTH)


with BuildPart() as body_2_24:
    # Sketch27 → Boss-Extrude27 (new body)
    with BuildSketch(Plane.XY.offset(BOSS_EXTRUDE27_START)):
        with Locations((68.35, -46)):
            Rectangle(SKETCH27_W, SKETCH27_H)
    extrude(amount=BOSS_EXTRUDE27_DEPTH)


with BuildPart() as part_24:
    add(part_23.part)

    # Combine24: cut body 2 24
    add(body_2_24.part, mode=Mode.SUBTRACT)

    # Sketch28 → Boss-Extrude28 (add)
    with BuildSketch(Plane(origin=(0, 0, 0), x_dir=(1, 0, 0), z_dir=(0, 1, 0)).offset(BOSS_EXTRUDE28_START)):
        Polygon((70.6, -73), (70.6, -74), (64.4, -74), (64.4, -74.4), (63.8, -74.4), (63, -73.6), (63, -73), align=None)
    extrude(amount=BOSS_EXTRUDE28_DEPTH)


solid = part_24.part
